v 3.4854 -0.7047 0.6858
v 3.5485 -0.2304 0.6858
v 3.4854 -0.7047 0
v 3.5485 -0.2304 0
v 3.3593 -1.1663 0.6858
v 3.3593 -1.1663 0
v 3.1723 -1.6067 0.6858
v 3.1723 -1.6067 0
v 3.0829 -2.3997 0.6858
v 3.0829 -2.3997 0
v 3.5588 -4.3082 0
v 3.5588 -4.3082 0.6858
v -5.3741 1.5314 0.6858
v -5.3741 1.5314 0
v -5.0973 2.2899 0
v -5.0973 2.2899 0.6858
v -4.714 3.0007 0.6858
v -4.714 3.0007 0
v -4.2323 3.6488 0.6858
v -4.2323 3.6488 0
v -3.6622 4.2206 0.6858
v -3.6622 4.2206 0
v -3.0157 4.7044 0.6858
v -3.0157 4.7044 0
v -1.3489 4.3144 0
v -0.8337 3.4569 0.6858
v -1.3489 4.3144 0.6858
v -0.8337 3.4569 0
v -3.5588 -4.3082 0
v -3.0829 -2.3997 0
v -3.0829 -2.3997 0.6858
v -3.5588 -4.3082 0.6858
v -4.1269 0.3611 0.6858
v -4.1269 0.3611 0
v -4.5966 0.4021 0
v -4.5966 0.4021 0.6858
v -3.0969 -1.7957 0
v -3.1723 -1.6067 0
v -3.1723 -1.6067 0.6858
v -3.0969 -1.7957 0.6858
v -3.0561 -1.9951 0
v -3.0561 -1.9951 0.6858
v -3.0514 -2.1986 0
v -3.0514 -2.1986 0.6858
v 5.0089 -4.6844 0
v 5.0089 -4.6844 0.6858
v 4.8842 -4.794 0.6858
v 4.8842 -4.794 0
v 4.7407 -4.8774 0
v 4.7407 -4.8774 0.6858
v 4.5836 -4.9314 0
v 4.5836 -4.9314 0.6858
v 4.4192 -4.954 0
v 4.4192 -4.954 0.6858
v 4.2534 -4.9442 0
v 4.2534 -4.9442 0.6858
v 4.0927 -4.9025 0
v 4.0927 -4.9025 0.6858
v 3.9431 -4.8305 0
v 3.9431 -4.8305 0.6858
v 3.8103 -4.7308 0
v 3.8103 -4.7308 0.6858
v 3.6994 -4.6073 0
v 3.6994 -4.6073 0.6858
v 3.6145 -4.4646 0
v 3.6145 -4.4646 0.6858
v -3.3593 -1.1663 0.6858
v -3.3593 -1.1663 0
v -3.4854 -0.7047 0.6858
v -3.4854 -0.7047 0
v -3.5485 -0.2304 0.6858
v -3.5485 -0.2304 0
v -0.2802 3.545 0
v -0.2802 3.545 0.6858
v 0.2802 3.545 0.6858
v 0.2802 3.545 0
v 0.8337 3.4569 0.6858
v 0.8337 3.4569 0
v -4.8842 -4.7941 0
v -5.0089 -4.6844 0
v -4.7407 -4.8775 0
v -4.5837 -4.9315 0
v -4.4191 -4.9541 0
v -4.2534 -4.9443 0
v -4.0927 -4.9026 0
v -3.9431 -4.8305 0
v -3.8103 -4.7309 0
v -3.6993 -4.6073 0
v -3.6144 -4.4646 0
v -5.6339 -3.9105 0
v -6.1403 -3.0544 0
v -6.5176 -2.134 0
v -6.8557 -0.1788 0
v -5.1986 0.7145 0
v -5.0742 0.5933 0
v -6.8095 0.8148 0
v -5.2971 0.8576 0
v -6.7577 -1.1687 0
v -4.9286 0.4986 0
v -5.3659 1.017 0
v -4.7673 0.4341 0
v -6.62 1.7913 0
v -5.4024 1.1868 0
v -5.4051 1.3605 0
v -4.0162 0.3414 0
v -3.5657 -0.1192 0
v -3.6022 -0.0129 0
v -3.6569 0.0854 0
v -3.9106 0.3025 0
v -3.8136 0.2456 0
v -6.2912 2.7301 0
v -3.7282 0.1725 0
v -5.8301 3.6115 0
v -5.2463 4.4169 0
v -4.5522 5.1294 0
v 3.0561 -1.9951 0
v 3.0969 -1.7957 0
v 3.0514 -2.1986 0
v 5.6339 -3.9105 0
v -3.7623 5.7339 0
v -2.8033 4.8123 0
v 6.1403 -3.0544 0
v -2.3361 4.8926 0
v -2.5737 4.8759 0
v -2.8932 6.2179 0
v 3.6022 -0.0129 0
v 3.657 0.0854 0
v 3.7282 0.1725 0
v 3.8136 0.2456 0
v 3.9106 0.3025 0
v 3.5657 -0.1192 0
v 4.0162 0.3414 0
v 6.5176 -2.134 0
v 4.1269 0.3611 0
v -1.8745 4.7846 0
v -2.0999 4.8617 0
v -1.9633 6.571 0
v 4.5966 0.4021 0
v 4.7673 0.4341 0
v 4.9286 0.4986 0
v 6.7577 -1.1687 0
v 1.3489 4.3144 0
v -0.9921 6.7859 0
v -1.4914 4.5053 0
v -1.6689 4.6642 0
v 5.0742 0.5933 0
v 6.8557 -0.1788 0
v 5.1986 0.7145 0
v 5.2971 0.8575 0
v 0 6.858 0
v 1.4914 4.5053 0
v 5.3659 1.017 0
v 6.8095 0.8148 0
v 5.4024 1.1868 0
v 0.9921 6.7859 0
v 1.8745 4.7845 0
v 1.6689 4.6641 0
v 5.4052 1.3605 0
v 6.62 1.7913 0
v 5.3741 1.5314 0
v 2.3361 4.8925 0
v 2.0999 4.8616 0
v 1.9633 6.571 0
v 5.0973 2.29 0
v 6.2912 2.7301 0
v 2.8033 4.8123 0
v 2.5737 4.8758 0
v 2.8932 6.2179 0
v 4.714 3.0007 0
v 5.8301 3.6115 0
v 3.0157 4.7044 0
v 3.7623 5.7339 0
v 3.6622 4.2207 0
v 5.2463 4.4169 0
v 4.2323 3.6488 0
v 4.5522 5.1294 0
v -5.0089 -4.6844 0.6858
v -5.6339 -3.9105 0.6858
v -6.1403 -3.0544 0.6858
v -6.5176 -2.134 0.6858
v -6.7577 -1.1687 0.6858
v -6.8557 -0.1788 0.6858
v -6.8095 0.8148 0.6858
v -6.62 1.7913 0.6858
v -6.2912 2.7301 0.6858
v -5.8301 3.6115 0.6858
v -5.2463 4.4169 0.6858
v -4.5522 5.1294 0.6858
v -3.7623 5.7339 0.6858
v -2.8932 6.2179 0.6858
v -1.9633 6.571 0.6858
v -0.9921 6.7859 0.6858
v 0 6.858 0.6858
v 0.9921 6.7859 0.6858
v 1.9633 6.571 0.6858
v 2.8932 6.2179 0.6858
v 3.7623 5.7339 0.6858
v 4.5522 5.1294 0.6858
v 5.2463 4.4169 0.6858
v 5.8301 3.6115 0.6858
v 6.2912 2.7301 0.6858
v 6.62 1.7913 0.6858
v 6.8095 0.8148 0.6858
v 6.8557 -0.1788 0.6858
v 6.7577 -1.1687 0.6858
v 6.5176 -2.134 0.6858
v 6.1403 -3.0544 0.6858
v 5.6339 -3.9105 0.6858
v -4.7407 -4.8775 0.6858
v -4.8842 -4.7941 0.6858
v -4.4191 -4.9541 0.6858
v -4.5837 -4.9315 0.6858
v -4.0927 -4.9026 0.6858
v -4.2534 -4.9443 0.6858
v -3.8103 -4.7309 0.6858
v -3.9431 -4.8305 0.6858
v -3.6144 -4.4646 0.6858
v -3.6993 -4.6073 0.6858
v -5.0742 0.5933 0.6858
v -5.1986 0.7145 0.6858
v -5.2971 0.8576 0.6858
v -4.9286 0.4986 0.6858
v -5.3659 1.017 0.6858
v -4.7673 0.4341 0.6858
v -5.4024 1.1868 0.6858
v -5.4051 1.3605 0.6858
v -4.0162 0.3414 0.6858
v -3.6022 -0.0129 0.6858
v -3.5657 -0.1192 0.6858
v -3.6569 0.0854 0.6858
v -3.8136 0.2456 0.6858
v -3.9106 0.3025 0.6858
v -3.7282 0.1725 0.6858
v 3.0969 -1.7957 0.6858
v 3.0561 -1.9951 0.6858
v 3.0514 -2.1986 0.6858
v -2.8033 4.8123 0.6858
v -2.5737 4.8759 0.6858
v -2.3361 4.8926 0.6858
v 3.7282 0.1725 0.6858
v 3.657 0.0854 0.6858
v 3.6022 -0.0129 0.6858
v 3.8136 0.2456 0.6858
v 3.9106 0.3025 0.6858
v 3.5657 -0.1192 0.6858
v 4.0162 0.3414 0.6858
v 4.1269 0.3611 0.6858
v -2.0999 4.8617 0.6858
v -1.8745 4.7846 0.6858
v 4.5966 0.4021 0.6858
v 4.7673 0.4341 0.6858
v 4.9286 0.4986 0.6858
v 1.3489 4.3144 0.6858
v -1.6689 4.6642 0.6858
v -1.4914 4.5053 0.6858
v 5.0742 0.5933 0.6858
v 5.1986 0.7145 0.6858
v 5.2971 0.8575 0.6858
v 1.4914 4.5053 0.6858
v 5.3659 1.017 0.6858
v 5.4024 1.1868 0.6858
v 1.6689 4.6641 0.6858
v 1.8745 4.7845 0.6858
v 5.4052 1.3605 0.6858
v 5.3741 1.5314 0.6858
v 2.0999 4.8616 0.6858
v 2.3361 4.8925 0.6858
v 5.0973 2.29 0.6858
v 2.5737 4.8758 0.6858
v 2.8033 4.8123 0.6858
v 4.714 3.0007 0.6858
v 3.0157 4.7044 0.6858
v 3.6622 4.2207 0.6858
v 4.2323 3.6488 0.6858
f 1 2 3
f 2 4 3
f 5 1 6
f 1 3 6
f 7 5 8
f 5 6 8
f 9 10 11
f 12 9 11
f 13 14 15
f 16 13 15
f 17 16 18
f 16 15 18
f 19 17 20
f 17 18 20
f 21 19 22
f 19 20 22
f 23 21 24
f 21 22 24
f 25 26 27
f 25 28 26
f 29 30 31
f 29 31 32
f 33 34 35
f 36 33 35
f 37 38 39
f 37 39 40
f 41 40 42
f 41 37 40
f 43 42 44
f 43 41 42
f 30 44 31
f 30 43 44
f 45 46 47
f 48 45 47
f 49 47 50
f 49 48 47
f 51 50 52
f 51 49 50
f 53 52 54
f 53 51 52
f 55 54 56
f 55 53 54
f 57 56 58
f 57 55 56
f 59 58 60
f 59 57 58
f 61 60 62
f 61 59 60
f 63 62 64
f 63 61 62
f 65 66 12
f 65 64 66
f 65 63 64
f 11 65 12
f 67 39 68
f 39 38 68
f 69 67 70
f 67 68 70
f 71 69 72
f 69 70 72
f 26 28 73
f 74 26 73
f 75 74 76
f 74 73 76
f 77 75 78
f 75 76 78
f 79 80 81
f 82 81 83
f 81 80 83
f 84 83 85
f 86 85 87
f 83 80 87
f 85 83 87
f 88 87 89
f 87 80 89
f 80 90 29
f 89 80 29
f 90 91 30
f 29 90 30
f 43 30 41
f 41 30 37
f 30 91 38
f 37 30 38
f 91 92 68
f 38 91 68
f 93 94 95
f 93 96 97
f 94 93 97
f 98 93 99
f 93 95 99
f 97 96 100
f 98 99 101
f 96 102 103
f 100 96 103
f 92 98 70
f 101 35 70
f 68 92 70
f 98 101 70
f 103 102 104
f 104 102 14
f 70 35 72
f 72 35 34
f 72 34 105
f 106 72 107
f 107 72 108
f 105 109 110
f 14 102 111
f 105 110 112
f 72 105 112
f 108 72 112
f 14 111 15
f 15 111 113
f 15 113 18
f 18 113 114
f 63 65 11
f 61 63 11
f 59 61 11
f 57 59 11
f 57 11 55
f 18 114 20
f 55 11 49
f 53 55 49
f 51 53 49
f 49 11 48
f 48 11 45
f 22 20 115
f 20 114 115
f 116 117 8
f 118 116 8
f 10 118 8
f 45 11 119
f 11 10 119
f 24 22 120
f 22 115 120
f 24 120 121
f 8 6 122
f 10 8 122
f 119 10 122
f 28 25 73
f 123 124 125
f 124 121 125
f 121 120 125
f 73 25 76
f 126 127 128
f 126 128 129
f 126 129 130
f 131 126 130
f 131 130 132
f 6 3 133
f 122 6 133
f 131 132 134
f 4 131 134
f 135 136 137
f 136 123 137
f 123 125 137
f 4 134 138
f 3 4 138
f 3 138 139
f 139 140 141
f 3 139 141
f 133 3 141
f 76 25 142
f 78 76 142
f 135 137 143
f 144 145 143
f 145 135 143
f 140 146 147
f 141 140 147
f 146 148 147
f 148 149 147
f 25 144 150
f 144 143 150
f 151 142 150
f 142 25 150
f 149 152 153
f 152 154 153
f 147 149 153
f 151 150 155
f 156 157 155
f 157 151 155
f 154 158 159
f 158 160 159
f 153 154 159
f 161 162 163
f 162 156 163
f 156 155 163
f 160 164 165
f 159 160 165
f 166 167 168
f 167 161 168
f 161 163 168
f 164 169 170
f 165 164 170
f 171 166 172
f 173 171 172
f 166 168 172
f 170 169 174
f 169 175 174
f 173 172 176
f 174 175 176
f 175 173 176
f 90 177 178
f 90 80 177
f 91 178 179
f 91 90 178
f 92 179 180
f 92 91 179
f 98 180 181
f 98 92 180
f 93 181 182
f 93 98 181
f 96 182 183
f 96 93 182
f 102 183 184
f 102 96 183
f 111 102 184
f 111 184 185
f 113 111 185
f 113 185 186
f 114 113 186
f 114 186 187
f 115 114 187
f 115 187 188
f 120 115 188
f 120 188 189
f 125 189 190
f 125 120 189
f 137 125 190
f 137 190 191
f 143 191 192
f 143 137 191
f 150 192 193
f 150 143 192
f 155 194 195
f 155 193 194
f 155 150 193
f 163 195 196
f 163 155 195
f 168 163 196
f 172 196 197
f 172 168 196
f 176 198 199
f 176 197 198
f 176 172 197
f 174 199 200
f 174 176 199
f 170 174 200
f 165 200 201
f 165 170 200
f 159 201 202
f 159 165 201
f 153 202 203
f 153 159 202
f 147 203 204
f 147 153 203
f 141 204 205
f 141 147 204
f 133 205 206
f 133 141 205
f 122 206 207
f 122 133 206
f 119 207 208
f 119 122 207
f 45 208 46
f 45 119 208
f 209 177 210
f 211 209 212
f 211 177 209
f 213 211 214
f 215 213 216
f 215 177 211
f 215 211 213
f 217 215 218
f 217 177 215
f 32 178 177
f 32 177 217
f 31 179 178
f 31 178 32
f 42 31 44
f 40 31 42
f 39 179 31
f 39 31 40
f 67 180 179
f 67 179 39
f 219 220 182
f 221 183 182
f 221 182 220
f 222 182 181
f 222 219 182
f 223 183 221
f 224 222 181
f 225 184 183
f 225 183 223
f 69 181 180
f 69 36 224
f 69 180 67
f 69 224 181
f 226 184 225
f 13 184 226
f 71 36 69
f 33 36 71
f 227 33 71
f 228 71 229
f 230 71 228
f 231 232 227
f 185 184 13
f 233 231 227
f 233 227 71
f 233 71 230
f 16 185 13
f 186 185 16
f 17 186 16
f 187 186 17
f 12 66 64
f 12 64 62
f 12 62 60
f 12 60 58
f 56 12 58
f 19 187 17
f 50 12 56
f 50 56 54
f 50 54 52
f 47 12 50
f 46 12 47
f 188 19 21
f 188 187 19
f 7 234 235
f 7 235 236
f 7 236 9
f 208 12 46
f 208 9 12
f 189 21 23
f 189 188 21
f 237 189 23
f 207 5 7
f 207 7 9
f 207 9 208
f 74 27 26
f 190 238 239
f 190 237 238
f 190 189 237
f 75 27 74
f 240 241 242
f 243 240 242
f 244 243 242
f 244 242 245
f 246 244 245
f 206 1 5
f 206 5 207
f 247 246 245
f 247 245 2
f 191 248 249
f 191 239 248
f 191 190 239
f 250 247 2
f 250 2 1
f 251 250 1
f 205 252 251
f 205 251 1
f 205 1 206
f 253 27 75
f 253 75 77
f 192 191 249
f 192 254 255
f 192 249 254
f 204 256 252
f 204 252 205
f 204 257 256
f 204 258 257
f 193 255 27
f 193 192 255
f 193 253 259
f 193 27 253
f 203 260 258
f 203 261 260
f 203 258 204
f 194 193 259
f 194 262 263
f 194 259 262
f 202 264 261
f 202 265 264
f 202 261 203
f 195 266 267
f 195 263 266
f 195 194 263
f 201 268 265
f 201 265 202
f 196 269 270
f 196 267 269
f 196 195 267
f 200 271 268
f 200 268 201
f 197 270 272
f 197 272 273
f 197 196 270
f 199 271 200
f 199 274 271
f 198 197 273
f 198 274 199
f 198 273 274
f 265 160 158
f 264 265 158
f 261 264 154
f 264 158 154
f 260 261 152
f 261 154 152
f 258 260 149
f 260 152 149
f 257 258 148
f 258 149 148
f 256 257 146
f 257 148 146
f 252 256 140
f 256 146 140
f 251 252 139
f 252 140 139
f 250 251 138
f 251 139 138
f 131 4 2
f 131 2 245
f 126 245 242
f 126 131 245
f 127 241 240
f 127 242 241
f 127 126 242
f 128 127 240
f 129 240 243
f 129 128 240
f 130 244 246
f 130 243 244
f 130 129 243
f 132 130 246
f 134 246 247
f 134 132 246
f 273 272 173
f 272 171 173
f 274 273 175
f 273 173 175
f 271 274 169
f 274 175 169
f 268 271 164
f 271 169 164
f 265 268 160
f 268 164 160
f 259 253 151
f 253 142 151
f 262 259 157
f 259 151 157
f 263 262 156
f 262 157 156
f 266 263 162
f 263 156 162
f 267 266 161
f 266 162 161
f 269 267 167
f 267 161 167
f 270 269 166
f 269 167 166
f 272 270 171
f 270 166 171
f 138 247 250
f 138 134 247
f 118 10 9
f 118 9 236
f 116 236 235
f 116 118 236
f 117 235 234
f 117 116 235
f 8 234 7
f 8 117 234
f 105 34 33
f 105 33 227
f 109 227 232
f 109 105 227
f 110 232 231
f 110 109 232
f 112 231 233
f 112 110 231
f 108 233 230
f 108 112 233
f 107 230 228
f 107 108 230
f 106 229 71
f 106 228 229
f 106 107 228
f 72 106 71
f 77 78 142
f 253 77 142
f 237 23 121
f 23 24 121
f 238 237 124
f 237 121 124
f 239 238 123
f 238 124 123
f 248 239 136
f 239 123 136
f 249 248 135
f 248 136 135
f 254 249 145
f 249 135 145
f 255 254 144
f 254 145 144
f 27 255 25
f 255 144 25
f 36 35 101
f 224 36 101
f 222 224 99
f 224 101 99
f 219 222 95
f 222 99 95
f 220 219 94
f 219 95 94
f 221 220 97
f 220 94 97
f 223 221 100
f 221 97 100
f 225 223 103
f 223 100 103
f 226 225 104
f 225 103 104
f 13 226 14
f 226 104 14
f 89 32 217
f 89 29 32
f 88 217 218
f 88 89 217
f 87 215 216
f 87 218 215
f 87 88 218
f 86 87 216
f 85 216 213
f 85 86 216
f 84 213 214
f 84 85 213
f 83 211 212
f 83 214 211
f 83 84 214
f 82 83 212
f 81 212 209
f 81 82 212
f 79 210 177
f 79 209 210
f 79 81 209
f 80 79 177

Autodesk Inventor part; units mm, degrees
ref_plane "YZ Plane" through (0, 0, 0) normal (1, 0, 0) x (0, 1, 0)
ref_plane "XZ Plane" through (0, 0, 0) normal (0, 1, 0) x (-1, 0, 0)
ref_plane "XY Plane" through (0, 0, 0) normal (0, 0, 1) x (1, 0, 0)
sketch "Sketch1" plane through (0, 0, 0) normal (0, 0, 1) x (1, 0, 0)
  arc A0 (5.0089, -4.6844) -> (-5.0089, -4.6844) centre (0, 0) ccw
  line L0 (0, 0) -> (0, 3.3219)
  line L1 (0, 0) -> (0, -6.858)
  line L2 (4.1269, 0.3611) -> (4.5966, 0.4021)
  line L3 (-4.1269, 0.3611) -> (-4.5966, 0.4021)
  line L4 (-3.0829, -2.3997) -> (-3.5588, -4.3082)
  line L5 (3.0829, -2.3997) -> (3.5588, -4.3082)
  arc A1 (0.8337, 3.4569) -> (-0.8337, 3.4569) centre (0, 0) ccw
  arc A2 (-3.5485, -0.2304) -> (-3.1723, -1.6067) centre (0, 0) ccw
  arc A3 (3.1723, -1.6067) -> (3.5485, -0.2304) centre (0, 0) ccw
  arc A4 (3.5588, -4.3082) -> (5.0089, -4.6844) centre (4.3861, -4.102) ccw
  arc A5 (-5.0089, -4.6844) -> (-3.5588, -4.3082) centre (-4.3861, -4.102) ccw
  arc A6 (4.1269, 0.3611) -> (3.5485, -0.2304) centre (4.1822, -0.2715) ccw
  arc A7 (3.1723, -1.6067) -> (3.0829, -2.3997) centre (4.192, -2.1232) ccw
  arc A8 (-3.5485, -0.2304) -> (-4.1269, 0.3611) centre (-4.1822, -0.2715) ccw
  arc A9 (-3.0829, -2.3997) -> (-3.1723, -1.6067) centre (-4.192, -2.1232) ccw
  arc A10 (4.5966, 0.4021) -> (5.3741, 1.5314) centre (4.5191, 1.2878) ccw
  arc A11 (3.0157, 4.7044) -> (1.3489, 4.3144) centre (2.3718, 3.6998) ccw
  arc A12 (-5.3741, 1.5314) -> (-4.5966, 0.4021) centre (-4.5191, 1.2878) ccw
  arc A13 (-1.3489, 4.3144) -> (-3.0157, 4.7044) centre (-2.3718, 3.6998) ccw
  line L6 (-0.8337, 3.4569) -> (-1.3489, 4.3144)
  line L7 (0.8337, 3.4569) -> (1.3489, 4.3144)
  arc A14 (5.3741, 1.5314) -> (3.0157, 4.7044) centre (0, 0) ccw
  arc A15 (-3.0157, 4.7044) -> (-5.3741, 1.5314) centre (0, 0) ccw
  point P0 (5.5667, 0.487)
  point P1 (-5.5667, 0.487)
  point P2 (-3.7479, -5.1854)
  point P3 (2.9716, -1.9532)
  point P4 (3.7479, -5.1854)
  point P5 (1.4868, 5.1225)
  point P6 (0, 2.4453)
  point P7 (-1.4868, 5.1225)
  point P8 (0, 2.4453)
  point P9 (-2.9716, -1.9532)
  point P10 (-0.8419, 3.4705)
  point P11 (-2.3046, 5.9049)
  point P12 (0.8419, 3.4705)
  point P13 (2.3046, 5.9049)
  dimension "d0" = 13.716
  dimension "d2" = 95
  dimension "d3" = 14
  dimension "d4" = 3.556
  dimension "d5" = 0.8527
  dimension "d6" = 3.556
  dimension "d7" = 14
  dimension "d8" = 1.27
  dimension "d9" = 1.27
  dimension "d10" = 1.778
  dimension "d11" = 31
  dimension "d12" = 2.286
extrude "Extrusion1" add sketch "Sketch1" along normal blind 0.6858
equation "\"d6\" = d4"
equation "\"d7\" = d3"
equation "\"d9\" = d8"
properties material "Steel"
